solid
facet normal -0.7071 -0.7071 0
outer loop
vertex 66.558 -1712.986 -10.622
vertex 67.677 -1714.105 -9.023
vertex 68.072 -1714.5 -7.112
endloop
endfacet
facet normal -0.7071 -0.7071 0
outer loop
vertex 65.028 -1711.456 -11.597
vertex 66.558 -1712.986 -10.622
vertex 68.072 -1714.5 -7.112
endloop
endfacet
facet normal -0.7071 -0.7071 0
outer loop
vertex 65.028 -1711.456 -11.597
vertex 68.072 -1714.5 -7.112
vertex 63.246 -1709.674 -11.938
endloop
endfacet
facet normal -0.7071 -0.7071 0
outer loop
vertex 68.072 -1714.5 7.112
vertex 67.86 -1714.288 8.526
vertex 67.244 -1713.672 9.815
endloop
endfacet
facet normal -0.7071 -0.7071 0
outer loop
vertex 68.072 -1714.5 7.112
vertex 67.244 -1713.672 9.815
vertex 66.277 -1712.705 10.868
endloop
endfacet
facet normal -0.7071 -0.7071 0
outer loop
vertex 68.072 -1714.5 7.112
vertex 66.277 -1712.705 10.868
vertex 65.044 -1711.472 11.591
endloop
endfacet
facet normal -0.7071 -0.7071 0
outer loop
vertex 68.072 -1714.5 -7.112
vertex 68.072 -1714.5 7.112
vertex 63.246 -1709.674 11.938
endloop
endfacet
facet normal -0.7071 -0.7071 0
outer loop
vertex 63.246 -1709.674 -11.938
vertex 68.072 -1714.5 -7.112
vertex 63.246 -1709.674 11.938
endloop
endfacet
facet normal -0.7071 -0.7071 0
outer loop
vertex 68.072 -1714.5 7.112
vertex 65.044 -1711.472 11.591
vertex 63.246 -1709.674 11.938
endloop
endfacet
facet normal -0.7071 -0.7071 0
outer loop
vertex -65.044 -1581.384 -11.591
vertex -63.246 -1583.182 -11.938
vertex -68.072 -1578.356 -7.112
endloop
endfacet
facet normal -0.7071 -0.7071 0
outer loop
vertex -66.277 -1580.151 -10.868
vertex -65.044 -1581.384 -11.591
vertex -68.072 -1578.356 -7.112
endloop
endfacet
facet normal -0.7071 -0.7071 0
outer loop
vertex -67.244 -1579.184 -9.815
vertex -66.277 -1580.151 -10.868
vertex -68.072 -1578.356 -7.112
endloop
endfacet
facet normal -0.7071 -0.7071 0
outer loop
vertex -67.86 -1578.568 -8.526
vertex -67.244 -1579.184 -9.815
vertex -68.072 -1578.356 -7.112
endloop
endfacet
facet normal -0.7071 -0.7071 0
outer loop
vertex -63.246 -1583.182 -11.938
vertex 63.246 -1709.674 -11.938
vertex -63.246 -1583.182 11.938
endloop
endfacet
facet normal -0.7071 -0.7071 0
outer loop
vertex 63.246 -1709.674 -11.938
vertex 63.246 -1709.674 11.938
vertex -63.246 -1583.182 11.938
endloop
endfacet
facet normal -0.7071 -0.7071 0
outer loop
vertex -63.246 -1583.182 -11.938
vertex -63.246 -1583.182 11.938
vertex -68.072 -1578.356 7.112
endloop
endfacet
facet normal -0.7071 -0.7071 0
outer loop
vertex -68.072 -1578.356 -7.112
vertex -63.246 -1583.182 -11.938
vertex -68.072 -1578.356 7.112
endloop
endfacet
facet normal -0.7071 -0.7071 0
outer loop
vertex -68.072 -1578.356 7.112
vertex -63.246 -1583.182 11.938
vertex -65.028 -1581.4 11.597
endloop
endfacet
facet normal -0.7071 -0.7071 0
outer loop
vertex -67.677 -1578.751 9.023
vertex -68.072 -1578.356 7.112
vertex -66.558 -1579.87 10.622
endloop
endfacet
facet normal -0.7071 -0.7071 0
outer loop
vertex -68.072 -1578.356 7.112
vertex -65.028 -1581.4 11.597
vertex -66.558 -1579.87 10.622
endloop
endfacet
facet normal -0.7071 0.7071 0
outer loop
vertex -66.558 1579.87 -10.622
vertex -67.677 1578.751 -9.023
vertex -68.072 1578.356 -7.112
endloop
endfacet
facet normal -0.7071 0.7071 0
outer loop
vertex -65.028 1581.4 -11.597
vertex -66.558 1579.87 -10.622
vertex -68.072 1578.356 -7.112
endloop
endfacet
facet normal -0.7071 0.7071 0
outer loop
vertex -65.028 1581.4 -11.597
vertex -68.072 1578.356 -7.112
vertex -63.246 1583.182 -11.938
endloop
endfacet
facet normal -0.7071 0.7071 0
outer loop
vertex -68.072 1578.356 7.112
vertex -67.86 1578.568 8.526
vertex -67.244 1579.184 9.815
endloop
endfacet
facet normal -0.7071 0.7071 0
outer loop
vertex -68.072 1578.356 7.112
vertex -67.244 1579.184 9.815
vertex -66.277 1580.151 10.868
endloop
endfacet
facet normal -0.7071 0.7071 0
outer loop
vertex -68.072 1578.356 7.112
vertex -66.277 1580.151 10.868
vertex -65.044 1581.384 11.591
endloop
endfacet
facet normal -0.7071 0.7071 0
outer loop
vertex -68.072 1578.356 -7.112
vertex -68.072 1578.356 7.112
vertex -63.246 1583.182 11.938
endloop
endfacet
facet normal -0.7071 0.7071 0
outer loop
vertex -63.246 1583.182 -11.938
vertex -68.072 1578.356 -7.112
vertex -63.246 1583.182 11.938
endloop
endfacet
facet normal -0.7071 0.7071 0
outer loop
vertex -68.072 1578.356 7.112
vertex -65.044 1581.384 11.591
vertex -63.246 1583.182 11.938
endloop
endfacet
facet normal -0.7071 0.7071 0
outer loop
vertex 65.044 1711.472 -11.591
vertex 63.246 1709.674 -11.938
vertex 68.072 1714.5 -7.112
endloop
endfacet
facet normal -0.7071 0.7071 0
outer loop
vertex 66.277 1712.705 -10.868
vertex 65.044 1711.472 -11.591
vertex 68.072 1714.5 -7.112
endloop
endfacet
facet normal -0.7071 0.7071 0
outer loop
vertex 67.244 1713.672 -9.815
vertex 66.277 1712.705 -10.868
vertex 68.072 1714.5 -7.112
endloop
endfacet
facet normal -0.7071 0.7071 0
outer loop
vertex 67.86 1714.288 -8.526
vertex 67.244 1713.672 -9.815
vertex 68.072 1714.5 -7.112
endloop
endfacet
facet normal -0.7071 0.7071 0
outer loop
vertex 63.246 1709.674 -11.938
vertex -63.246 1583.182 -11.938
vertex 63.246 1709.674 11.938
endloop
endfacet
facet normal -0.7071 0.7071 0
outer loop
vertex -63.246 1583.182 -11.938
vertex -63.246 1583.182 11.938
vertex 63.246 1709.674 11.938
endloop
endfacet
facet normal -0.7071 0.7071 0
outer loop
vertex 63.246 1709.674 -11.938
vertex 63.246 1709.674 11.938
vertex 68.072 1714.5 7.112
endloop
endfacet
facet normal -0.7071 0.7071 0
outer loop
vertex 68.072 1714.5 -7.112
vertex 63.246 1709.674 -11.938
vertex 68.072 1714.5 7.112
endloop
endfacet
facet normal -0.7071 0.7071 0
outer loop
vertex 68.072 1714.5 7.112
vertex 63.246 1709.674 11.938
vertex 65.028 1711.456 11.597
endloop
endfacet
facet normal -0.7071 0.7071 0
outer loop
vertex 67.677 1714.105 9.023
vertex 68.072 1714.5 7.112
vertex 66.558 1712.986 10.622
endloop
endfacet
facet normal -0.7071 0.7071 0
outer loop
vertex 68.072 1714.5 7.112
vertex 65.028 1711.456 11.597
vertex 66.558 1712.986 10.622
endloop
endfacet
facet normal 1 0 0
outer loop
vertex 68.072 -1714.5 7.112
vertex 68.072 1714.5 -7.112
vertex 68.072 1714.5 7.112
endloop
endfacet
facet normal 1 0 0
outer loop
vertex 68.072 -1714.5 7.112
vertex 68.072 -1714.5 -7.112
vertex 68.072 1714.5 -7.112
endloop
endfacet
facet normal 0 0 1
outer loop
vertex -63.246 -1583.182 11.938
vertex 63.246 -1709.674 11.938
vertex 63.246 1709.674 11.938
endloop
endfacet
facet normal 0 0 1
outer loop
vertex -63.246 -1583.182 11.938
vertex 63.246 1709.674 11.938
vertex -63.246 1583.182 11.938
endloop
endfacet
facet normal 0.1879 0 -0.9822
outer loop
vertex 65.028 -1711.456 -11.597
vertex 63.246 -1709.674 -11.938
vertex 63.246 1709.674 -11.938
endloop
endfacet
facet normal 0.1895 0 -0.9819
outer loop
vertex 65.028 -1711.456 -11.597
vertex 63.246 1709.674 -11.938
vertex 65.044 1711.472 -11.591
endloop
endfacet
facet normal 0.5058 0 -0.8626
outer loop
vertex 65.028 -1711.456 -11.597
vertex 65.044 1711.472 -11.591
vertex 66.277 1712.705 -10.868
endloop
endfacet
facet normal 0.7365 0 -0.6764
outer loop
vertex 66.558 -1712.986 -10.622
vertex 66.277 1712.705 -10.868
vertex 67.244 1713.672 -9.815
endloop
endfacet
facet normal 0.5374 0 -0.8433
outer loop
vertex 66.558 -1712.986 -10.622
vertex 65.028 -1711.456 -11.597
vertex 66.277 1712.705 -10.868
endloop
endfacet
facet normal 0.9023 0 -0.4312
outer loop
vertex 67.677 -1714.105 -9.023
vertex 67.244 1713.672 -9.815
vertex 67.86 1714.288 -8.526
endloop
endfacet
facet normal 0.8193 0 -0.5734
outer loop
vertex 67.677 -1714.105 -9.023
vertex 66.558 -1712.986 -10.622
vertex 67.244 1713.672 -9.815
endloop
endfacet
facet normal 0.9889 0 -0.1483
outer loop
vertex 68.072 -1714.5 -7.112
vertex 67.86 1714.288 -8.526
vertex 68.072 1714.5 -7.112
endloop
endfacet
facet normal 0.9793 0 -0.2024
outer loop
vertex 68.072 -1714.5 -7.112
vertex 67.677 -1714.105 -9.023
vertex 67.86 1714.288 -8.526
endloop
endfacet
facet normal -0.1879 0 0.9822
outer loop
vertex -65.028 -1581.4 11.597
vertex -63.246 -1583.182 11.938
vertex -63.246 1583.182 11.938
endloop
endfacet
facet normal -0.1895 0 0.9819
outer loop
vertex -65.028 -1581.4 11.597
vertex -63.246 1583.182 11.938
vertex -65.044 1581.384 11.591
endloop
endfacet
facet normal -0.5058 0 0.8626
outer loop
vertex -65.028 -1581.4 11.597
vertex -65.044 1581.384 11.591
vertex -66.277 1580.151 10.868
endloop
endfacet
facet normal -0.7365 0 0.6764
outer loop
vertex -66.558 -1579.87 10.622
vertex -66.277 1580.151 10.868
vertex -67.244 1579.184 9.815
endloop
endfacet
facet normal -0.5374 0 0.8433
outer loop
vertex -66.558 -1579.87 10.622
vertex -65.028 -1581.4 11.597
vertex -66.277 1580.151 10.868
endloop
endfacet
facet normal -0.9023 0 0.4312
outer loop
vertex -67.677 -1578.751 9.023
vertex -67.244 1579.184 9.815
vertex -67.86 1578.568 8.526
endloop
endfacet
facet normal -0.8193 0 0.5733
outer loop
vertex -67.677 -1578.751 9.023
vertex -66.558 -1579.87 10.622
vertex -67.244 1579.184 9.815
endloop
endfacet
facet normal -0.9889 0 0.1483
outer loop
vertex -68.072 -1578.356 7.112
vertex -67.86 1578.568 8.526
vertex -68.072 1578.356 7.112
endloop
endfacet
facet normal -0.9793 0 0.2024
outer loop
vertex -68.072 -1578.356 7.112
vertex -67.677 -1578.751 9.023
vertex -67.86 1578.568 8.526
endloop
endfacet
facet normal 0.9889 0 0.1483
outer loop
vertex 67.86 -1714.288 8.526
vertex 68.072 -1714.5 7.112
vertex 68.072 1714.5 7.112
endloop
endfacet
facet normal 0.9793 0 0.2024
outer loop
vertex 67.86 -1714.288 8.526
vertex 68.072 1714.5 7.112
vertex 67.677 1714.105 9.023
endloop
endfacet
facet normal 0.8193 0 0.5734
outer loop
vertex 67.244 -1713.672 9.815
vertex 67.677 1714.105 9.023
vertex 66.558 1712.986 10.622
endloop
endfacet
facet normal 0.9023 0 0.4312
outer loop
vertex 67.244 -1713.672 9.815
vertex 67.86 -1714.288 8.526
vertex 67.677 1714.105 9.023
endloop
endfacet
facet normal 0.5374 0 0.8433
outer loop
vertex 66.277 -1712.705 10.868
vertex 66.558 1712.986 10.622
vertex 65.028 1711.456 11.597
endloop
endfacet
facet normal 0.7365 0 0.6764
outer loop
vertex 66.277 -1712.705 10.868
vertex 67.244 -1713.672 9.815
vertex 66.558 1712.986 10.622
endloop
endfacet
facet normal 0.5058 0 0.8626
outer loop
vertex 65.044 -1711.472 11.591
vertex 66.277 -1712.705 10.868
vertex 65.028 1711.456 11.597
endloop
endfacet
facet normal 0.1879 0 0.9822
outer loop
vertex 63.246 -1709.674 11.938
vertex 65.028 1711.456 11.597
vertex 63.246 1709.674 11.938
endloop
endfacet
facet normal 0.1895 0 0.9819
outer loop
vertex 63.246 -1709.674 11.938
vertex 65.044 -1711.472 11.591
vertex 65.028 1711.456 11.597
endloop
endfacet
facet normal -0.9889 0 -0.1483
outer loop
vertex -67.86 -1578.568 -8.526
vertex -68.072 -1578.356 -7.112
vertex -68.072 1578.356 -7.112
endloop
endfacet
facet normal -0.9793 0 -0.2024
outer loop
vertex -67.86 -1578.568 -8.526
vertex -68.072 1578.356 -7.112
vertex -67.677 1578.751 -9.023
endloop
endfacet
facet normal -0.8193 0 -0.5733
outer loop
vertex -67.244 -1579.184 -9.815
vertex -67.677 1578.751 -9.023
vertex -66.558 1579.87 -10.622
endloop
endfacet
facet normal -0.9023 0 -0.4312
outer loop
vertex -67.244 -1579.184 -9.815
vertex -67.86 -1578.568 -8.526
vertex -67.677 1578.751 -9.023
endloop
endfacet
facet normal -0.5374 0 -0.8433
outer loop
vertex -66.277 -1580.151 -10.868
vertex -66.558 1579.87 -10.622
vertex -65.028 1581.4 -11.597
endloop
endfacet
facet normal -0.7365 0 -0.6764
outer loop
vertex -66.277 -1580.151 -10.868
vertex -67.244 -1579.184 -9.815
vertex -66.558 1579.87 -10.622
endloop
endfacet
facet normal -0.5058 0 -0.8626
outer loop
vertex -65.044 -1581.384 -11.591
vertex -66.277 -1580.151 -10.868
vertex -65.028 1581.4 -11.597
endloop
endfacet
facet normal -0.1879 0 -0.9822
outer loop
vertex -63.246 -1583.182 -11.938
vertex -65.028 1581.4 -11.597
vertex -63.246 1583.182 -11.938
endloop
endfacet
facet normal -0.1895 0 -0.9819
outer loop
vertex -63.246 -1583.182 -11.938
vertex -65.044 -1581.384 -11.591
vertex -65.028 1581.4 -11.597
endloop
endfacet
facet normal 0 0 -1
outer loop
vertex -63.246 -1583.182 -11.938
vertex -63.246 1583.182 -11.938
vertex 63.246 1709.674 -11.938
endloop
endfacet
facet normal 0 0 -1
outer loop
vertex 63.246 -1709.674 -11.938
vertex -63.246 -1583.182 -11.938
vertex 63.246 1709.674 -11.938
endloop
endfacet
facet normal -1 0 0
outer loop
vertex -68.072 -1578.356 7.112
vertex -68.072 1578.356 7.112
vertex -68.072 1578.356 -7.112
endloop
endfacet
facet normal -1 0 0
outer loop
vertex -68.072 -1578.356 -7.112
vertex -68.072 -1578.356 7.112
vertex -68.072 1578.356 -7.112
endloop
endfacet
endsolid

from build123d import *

# Parameters (mm, degrees)
F1_DEPTH = 1714.5
F3_DEPTH = 23.877


with BuildPart() as f1:
    # F0 (on Front) → F1 (new body, symmetric)
    with BuildSketch(Plane.XZ):
        with BuildLine():
            Line((63.246, 11.938), (-63.246, 11.938))
            ThreePointArc((-63.246, 11.938), (-66.658497, 10.524497), (-68.072, 7.112))
            Line((-68.072, 7.112), (-68.072, -7.112))
            ThreePointArc((-68.072, -7.112), (-66.658497, -10.524497), (-63.246, -11.938))
            Line((-63.246, -11.938), (63.246, -11.938))
            ThreePointArc((63.246, -11.938), (66.658497, -10.524497), (68.072, -7.112))
            Line((68.072, -7.112), (68.072, 7.112))
            ThreePointArc((68.072, 7.112), (66.658497, 10.524497), (63.246, 11.938))
        make_face()
    extrude(amount=F1_DEPTH, both=True)

    # F2 (on face) → F3 (cut, through all)
    with BuildSketch(Plane.XY.offset(11.938)):
        Polygon((68.072, -1714.5), (-68.072, -1578.356), (-68.072, -1714.5), align=None)
        Polygon((-68.072, 1714.5), (-68.072, 1578.356), (68.072, 1714.5), align=None)
    extrude(amount=-F3_DEPTH, mode=Mode.SUBTRACT)


solid = f1.part
